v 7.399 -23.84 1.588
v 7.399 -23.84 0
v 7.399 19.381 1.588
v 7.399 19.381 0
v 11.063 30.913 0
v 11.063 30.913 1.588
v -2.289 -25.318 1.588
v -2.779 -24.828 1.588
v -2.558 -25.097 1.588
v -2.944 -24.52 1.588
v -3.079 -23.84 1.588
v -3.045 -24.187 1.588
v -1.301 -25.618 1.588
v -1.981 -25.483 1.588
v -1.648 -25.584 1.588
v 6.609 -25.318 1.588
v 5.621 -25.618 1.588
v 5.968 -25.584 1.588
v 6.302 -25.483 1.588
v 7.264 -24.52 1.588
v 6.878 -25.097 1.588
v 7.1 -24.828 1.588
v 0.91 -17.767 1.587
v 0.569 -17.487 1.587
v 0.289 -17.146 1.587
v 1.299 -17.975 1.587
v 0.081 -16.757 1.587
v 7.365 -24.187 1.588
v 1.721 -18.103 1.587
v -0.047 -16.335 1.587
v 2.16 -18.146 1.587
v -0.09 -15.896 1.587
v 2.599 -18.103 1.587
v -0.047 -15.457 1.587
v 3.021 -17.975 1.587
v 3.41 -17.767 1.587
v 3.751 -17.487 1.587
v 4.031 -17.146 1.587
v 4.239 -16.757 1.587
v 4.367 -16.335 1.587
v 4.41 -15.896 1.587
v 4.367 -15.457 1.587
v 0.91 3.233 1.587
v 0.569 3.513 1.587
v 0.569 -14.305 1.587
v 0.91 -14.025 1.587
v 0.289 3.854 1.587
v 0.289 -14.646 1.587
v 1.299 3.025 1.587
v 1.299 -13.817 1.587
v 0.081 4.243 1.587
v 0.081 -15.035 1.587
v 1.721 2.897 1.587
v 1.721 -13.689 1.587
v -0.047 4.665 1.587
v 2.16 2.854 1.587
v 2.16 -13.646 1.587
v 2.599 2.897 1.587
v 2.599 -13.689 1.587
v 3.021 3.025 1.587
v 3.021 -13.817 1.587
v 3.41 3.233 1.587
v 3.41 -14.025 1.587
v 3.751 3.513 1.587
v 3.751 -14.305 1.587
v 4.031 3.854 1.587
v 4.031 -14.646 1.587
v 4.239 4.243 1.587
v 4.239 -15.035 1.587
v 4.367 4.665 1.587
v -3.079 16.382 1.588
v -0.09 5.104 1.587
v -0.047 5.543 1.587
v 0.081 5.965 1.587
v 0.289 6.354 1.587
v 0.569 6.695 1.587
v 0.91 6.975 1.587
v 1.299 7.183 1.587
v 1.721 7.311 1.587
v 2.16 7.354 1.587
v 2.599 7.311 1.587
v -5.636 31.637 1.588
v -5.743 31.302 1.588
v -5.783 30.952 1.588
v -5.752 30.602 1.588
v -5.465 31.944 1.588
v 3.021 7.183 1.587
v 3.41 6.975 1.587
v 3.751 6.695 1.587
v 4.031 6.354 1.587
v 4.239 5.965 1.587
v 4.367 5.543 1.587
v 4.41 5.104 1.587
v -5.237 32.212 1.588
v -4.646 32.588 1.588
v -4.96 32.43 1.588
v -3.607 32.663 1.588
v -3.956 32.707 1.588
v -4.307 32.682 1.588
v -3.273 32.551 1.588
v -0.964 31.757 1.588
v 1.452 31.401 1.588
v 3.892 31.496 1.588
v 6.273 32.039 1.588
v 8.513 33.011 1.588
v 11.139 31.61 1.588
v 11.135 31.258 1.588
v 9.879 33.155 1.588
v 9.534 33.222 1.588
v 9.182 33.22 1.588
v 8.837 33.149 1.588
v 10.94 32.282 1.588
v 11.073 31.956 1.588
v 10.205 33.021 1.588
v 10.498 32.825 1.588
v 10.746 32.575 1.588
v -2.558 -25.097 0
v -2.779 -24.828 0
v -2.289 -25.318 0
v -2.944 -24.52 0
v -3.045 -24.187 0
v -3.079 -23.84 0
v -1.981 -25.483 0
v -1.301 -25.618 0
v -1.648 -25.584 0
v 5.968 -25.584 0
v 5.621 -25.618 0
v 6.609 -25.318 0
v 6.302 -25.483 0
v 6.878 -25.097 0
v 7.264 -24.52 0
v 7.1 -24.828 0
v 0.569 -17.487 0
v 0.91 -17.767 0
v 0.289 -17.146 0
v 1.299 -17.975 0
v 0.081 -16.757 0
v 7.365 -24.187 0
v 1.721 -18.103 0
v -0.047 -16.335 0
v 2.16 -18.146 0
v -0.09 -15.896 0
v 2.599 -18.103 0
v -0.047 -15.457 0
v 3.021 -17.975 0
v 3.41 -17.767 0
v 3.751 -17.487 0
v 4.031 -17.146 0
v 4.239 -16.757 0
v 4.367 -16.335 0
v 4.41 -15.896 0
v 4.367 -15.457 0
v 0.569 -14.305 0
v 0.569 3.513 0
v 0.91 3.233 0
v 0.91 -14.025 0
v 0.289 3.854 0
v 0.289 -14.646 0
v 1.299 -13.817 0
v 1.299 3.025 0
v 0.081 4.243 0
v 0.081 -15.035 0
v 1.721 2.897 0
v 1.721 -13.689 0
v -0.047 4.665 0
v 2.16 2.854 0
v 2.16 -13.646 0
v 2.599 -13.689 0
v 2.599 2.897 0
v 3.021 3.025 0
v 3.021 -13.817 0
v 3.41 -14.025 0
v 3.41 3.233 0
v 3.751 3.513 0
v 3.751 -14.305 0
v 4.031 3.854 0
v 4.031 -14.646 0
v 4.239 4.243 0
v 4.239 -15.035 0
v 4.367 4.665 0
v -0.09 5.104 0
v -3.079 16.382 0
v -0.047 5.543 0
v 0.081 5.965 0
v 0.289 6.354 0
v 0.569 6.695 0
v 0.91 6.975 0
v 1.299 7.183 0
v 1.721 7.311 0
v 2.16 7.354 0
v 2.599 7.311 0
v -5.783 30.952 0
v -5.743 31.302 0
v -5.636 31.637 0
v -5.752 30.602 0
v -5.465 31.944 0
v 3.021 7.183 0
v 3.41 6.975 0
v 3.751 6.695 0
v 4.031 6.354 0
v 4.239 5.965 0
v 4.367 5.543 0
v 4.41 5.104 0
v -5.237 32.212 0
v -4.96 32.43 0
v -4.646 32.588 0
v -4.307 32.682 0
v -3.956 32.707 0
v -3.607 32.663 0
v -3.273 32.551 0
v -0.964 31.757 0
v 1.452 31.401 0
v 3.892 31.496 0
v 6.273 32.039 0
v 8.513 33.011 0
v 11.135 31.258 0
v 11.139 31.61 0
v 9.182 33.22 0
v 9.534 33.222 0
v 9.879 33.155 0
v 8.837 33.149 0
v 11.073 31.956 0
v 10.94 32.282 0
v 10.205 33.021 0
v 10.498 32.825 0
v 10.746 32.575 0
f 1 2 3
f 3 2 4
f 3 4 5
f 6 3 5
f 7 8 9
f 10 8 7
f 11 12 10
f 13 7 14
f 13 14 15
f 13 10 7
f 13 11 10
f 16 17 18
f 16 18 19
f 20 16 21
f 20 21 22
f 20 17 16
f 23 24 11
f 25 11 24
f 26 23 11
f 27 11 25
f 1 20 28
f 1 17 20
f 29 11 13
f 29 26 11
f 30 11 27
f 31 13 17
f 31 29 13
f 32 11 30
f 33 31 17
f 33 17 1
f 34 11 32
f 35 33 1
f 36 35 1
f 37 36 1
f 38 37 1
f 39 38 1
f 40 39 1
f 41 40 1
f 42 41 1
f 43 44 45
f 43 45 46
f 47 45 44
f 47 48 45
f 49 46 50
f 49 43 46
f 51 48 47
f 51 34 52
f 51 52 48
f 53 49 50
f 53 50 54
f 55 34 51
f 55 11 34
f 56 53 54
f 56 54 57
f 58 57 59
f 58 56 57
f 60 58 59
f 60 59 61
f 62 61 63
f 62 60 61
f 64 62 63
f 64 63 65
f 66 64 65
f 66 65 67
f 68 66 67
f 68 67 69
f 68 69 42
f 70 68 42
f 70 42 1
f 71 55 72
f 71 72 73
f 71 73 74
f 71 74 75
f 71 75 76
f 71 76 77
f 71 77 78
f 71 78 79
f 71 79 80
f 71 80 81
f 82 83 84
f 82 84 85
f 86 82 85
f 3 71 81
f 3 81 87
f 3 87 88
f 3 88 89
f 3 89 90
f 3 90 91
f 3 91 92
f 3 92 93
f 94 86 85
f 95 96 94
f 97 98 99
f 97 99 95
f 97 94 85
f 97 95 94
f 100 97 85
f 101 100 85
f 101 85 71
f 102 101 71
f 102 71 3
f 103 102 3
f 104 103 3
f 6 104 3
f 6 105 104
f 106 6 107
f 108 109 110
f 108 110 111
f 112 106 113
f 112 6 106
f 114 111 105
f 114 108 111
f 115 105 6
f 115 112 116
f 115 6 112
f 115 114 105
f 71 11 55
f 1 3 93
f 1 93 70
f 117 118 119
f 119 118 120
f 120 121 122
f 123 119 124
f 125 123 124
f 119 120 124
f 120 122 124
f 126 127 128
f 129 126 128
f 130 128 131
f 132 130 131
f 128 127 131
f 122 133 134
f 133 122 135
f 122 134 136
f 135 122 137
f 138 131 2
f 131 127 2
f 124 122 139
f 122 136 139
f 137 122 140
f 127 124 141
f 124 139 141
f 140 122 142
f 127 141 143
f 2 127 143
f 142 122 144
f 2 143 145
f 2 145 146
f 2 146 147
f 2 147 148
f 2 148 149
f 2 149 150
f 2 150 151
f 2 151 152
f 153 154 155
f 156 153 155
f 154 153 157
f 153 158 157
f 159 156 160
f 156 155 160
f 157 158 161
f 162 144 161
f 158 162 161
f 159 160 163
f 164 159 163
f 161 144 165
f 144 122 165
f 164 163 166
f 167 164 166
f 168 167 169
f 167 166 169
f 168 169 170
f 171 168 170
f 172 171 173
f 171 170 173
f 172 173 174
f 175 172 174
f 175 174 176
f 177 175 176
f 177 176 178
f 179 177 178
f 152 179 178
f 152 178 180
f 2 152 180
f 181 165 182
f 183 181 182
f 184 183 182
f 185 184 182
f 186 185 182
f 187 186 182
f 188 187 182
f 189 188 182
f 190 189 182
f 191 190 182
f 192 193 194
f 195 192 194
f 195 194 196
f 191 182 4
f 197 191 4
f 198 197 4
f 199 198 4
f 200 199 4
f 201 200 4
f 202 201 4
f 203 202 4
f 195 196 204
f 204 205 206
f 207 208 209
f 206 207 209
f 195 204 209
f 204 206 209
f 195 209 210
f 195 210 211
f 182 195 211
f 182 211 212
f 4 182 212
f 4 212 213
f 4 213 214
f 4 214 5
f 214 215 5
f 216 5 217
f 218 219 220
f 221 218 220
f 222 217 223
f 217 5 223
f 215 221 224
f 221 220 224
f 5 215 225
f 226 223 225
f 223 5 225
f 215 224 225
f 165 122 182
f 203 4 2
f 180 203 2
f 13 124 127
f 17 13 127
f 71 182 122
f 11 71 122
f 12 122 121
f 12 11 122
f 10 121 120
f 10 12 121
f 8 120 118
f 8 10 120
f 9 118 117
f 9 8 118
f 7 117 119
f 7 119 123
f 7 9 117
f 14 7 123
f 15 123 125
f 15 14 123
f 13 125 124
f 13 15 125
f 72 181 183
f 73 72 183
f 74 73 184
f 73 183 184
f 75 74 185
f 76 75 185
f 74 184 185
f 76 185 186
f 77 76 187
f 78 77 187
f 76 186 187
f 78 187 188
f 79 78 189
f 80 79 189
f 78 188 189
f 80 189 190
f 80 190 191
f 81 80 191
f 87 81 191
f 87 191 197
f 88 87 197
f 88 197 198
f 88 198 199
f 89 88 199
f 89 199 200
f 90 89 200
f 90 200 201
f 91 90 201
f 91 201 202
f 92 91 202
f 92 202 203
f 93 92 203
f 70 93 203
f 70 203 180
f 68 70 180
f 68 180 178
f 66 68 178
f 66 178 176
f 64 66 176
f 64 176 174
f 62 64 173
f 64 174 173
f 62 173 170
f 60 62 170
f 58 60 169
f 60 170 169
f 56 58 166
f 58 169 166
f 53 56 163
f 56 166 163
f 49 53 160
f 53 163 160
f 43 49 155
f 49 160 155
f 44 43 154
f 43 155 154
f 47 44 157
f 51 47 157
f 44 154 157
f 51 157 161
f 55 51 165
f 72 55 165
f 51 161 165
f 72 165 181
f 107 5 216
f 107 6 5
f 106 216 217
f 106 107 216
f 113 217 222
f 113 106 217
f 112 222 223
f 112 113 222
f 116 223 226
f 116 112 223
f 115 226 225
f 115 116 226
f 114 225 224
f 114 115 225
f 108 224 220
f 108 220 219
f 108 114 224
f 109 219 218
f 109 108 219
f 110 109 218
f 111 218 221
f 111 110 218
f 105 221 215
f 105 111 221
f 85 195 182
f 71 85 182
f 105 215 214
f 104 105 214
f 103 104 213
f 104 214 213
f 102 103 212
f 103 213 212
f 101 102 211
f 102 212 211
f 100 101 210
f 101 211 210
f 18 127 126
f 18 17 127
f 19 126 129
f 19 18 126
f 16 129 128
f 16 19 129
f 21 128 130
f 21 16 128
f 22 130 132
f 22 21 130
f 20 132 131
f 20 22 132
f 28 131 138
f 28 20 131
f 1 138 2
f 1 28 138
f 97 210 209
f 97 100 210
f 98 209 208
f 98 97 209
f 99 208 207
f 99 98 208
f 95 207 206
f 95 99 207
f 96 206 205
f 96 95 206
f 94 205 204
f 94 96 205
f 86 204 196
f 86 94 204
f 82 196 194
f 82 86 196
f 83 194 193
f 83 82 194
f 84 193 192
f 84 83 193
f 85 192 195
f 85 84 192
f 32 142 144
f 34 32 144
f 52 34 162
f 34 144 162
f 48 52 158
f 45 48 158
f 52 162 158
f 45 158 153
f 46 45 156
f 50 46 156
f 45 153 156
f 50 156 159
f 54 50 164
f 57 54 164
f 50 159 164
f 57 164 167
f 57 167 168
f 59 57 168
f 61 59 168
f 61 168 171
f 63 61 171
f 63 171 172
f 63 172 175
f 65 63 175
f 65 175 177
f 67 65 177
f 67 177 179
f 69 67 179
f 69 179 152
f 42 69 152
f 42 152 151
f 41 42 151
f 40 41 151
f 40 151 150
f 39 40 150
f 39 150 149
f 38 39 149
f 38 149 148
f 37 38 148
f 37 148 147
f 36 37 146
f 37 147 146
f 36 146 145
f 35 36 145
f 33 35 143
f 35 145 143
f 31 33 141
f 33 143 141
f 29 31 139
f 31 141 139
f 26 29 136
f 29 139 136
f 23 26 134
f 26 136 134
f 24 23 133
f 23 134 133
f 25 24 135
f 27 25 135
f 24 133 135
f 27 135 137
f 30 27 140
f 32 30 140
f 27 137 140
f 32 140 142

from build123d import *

# Parameters (mm, degrees)
BOSS_EXTRUDE1_DEPTH  = 1.5875
FILLET2_R            = 1.778
M4_CLEARANCE_HOLE2_D = 4.5


with BuildPart() as part:
    # Sketch1 → Boss-Extrude1 (new body)
    with BuildSketch(Plane.XY):
        with BuildLine():
            Line((-3.078924099, 16.382133449), (-3.078924099, -25.617866551))
            Line((-3.078924099, -25.617866551), (2.159951047, -25.617866551))
            Line((2.159951047, -25.617866551), (7.399260817, -25.617866551))
            Line((7.399260817, -25.617866551), (7.399260817, 4.381445812))
            Line((7.399260817, 4.381445812), (7.399260817, 19.381445781))
            Line((7.399260817, 19.381445781), (13.018541309, 37.070554481))
            ThreePointArc((13.018541309, 37.070554481), (3.802061978, 31.484715671), (-6.508003397, 34.622810382))
            Line((-6.508003397, 34.622810382), (-3.078924099, 16.382133449))
        make_face()
    extrude(amount=BOSS_EXTRUDE1_DEPTH)

    # Fillet2
    fillet2_edges = [part.edges().sort_by_distance(p)[0] for p in [
        (-3.078924099, -25.617866551, 0.79375),
        (-6.508003397, 34.622810382, 0.79375),
        (13.018541309, 37.070554481, 0.79375),
        (7.399260817, -25.617866551, 0.79375),
    ]]
    fillet(fillet2_edges, radius=FILLET2_R)

    # M4 Clearance Hole2 (through all)
    with Locations(Plane.XY.offset(1.5875)):
        with Locations((2.160168359, 5.103784263), (2.160168359, -15.895866551)):
            Hole(M4_CLEARANCE_HOLE2_D / 2)


solid = part.part
